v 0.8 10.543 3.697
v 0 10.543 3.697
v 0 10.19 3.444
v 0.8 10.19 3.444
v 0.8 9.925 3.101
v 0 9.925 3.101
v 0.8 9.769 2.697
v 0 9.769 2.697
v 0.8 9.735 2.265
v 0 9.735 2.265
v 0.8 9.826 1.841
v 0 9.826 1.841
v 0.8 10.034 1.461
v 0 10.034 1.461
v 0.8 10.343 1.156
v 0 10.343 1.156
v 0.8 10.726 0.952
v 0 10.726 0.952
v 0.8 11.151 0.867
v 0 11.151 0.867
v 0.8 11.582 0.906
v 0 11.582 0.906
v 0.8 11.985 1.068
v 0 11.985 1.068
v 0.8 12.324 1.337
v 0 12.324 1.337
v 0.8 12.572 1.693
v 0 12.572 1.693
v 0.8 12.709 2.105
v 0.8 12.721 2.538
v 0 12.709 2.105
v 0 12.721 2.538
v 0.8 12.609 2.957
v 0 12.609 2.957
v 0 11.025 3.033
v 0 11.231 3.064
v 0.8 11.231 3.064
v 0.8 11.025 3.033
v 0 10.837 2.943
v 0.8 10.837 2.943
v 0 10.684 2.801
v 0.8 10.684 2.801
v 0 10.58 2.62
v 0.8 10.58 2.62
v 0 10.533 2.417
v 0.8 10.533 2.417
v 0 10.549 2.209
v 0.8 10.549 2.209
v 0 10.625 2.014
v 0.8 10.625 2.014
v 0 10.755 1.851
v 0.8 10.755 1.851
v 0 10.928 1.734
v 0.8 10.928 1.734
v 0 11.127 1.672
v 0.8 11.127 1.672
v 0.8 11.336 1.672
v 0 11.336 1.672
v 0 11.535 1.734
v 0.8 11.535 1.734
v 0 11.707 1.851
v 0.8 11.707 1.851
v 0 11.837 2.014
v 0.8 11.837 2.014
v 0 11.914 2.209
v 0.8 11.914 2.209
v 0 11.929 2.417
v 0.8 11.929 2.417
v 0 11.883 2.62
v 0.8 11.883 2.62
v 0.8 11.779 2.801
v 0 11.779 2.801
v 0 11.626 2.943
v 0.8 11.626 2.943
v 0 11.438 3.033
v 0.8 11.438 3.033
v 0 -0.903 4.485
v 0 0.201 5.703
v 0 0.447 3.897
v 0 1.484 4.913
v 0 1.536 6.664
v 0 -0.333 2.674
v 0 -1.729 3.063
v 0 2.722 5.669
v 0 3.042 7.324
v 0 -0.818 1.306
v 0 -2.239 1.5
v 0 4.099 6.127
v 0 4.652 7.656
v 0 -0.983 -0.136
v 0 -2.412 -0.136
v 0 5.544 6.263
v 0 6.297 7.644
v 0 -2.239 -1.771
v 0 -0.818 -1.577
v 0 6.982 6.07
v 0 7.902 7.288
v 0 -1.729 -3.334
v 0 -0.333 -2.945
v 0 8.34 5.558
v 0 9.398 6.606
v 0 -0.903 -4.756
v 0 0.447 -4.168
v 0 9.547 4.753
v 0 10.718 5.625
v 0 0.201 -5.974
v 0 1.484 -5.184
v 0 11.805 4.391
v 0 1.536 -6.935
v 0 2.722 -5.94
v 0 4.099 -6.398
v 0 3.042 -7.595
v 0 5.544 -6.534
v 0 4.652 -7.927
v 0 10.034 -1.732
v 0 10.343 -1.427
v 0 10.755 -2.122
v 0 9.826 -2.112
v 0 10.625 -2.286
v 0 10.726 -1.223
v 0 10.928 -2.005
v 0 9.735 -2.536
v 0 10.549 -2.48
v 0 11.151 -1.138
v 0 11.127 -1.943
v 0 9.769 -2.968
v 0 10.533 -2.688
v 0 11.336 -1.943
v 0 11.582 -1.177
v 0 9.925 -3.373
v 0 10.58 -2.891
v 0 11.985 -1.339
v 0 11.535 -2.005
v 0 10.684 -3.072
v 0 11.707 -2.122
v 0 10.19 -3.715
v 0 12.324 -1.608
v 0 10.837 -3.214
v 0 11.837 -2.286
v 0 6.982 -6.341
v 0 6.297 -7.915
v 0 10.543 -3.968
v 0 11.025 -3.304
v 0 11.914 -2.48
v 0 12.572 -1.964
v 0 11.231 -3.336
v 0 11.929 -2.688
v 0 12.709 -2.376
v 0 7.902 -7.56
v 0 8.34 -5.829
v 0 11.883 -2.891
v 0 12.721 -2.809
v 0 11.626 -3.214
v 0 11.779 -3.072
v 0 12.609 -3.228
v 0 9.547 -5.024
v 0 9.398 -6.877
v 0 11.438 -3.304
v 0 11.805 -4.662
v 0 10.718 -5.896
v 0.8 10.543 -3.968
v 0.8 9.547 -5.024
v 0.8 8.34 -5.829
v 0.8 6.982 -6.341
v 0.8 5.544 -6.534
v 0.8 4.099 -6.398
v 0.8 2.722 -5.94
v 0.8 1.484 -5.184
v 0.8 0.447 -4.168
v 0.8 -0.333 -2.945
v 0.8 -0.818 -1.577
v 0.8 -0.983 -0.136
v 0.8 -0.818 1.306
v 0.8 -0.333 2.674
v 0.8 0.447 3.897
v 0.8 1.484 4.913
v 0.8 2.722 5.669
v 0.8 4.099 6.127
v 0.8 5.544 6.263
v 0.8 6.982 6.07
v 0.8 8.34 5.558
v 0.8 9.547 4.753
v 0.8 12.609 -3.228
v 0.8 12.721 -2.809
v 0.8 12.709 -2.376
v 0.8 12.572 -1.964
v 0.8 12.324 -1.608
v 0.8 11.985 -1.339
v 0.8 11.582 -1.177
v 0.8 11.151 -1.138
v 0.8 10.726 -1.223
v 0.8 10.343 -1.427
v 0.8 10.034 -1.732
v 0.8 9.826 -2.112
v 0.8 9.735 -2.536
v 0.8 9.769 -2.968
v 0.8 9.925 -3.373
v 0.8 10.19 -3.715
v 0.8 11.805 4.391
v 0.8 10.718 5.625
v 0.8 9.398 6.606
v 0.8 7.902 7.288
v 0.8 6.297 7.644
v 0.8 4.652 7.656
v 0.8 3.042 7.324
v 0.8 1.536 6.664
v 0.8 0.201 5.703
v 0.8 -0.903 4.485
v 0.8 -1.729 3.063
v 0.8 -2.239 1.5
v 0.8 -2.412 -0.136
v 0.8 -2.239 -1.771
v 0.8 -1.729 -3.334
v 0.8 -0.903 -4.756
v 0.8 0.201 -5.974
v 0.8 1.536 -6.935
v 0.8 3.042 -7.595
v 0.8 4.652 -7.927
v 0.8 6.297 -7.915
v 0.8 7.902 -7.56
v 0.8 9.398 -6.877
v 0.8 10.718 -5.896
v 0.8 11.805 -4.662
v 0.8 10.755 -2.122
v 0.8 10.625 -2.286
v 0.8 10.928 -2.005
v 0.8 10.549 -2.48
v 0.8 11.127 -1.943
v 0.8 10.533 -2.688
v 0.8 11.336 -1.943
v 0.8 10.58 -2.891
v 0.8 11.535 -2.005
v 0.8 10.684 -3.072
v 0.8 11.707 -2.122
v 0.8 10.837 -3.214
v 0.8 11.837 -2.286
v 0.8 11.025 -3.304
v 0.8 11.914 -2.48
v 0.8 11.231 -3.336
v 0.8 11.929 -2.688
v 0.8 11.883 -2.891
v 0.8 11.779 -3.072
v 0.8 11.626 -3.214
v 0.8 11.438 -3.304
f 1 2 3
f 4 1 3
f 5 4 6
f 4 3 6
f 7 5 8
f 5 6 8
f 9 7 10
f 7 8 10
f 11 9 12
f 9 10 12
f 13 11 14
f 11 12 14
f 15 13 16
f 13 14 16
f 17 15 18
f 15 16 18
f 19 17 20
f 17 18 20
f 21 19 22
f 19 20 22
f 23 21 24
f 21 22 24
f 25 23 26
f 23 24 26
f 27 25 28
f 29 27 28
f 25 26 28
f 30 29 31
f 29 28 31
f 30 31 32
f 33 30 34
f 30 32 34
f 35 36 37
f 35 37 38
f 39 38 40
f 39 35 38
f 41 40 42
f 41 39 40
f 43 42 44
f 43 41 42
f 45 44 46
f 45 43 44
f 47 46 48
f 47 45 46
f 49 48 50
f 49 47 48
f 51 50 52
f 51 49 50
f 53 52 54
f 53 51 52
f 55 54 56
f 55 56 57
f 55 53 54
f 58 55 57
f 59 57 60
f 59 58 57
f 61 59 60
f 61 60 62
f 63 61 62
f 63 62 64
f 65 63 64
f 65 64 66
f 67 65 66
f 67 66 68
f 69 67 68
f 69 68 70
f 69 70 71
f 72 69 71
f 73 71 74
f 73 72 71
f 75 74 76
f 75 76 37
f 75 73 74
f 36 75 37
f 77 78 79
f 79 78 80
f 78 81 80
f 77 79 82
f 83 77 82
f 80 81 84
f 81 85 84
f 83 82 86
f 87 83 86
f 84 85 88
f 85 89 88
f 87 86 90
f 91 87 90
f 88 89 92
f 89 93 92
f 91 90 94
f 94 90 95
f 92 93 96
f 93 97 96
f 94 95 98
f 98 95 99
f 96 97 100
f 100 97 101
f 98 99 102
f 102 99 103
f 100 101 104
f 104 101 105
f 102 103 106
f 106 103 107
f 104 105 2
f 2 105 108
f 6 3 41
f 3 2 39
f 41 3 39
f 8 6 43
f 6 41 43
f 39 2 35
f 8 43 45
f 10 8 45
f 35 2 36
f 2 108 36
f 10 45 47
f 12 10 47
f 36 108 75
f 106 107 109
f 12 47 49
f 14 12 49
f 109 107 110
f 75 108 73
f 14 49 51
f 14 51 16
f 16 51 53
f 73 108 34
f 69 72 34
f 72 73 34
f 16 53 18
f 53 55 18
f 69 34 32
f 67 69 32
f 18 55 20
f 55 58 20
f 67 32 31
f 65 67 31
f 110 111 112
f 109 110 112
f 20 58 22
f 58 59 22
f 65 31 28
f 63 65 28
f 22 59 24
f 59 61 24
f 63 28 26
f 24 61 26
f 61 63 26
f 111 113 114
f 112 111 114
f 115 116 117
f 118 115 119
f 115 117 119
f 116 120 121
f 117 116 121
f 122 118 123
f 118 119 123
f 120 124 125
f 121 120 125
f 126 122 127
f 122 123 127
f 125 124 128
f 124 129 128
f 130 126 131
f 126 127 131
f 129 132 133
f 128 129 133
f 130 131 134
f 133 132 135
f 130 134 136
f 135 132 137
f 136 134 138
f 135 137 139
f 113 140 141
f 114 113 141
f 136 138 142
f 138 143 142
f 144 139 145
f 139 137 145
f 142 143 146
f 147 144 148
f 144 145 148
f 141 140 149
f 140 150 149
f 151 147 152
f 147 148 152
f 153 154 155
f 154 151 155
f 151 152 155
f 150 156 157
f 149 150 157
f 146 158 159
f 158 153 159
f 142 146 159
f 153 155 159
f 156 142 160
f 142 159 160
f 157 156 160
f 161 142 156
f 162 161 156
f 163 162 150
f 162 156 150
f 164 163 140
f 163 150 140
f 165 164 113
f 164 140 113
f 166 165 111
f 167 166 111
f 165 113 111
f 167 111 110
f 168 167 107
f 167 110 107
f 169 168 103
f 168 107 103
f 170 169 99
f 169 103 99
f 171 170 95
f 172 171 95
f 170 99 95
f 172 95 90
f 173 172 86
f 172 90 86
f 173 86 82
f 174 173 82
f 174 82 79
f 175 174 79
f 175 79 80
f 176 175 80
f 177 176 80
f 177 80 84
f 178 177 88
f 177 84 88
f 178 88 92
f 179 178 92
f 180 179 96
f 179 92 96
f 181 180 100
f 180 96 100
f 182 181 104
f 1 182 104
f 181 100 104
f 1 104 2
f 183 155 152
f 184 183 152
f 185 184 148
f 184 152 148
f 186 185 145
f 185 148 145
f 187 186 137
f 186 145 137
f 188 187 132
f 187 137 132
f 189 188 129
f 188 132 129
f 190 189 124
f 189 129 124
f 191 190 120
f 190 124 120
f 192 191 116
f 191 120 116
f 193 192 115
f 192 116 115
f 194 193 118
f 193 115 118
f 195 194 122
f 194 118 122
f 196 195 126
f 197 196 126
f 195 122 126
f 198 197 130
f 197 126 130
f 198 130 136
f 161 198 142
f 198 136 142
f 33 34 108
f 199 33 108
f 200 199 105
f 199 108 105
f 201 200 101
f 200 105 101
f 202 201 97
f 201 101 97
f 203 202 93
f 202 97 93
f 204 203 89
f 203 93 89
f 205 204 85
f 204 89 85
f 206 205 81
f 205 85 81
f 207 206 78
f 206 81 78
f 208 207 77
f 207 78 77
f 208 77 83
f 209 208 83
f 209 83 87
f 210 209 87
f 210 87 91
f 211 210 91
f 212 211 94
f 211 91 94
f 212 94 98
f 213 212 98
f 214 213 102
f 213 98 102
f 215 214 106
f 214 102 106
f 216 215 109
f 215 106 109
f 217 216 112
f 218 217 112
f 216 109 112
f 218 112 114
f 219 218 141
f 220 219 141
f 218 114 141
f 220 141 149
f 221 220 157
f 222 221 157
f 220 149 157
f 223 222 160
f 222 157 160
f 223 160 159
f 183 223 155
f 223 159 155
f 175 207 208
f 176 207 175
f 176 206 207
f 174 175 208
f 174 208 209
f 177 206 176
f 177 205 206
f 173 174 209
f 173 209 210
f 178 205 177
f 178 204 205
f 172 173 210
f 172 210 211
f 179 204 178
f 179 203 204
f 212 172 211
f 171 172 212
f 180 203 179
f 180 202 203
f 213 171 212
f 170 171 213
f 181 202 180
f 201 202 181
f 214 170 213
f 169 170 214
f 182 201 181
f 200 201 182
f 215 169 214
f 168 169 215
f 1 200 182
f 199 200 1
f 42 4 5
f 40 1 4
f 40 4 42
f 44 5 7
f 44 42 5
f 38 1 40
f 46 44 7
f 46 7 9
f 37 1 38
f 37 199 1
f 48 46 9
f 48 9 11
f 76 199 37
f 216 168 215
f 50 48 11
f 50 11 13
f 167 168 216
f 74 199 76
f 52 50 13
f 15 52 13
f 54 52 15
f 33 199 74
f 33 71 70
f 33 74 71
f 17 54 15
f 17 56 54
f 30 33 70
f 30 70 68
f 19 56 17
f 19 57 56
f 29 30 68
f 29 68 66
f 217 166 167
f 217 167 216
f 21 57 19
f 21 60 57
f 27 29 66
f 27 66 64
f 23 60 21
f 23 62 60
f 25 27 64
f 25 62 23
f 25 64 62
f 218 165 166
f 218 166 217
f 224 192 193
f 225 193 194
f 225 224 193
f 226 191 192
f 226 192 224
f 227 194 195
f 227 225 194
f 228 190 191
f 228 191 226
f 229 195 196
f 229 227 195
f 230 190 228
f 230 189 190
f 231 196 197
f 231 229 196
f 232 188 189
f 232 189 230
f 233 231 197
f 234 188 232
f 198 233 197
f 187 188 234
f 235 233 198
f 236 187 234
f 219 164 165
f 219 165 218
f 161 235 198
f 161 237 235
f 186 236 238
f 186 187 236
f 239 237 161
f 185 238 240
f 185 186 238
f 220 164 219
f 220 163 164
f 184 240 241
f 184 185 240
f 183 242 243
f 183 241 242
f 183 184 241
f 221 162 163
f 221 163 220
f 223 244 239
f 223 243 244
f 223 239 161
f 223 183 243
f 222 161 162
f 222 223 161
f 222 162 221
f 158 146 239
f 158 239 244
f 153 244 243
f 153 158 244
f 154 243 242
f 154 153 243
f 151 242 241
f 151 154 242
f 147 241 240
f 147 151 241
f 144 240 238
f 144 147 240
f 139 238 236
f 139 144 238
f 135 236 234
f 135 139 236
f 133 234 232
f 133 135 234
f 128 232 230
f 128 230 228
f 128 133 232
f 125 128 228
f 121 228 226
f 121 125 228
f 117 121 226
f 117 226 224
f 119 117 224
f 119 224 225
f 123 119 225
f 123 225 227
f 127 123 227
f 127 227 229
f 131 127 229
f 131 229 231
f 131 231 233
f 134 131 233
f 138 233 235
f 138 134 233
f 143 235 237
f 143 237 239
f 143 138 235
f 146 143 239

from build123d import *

# Parameters (mm, degrees)
SKETCH1_R           = 0.7
BOSS_EXTRUDE1_DEPTH = 0.8


with BuildPart() as part:
    # Sketch1 → Boss-Extrude1 (new body)
    with BuildSketch(Plane(origin=(0, 0, 0), x_dir=(0, 0, -1), z_dir=(1, 0, 0))):
        with BuildLine():
            ThreePointArc((3.228042319, 12.609235821), (1.223335432, 10.725526511), (3.968101377, 10.542577405))
            ThreePointArc((3.968101377, 10.542577405), (0.135522118, -0.982979757), (-3.697057141, 10.542577405))
            ThreePointArc((-3.697057141, 10.542577405), (-0.952291196, 10.725526511), (-2.956998083, 12.609235821))
            ThreePointArc((-2.956998083, 12.609235821), (0.135522118, -2.4118779), (3.228042319, 12.609235821))
        make_face()
        with Locations((2.635522118, 11.231222828)):
            Circle(SKETCH1_R, mode=Mode.SUBTRACT)
        with Locations(Location((-2.364477882, 11.231222828, 0), (0, 0, 180))):
            Circle(SKETCH1_R, mode=Mode.SUBTRACT)
    extrude(amount=BOSS_EXTRUDE1_DEPTH)


solid = part.part
